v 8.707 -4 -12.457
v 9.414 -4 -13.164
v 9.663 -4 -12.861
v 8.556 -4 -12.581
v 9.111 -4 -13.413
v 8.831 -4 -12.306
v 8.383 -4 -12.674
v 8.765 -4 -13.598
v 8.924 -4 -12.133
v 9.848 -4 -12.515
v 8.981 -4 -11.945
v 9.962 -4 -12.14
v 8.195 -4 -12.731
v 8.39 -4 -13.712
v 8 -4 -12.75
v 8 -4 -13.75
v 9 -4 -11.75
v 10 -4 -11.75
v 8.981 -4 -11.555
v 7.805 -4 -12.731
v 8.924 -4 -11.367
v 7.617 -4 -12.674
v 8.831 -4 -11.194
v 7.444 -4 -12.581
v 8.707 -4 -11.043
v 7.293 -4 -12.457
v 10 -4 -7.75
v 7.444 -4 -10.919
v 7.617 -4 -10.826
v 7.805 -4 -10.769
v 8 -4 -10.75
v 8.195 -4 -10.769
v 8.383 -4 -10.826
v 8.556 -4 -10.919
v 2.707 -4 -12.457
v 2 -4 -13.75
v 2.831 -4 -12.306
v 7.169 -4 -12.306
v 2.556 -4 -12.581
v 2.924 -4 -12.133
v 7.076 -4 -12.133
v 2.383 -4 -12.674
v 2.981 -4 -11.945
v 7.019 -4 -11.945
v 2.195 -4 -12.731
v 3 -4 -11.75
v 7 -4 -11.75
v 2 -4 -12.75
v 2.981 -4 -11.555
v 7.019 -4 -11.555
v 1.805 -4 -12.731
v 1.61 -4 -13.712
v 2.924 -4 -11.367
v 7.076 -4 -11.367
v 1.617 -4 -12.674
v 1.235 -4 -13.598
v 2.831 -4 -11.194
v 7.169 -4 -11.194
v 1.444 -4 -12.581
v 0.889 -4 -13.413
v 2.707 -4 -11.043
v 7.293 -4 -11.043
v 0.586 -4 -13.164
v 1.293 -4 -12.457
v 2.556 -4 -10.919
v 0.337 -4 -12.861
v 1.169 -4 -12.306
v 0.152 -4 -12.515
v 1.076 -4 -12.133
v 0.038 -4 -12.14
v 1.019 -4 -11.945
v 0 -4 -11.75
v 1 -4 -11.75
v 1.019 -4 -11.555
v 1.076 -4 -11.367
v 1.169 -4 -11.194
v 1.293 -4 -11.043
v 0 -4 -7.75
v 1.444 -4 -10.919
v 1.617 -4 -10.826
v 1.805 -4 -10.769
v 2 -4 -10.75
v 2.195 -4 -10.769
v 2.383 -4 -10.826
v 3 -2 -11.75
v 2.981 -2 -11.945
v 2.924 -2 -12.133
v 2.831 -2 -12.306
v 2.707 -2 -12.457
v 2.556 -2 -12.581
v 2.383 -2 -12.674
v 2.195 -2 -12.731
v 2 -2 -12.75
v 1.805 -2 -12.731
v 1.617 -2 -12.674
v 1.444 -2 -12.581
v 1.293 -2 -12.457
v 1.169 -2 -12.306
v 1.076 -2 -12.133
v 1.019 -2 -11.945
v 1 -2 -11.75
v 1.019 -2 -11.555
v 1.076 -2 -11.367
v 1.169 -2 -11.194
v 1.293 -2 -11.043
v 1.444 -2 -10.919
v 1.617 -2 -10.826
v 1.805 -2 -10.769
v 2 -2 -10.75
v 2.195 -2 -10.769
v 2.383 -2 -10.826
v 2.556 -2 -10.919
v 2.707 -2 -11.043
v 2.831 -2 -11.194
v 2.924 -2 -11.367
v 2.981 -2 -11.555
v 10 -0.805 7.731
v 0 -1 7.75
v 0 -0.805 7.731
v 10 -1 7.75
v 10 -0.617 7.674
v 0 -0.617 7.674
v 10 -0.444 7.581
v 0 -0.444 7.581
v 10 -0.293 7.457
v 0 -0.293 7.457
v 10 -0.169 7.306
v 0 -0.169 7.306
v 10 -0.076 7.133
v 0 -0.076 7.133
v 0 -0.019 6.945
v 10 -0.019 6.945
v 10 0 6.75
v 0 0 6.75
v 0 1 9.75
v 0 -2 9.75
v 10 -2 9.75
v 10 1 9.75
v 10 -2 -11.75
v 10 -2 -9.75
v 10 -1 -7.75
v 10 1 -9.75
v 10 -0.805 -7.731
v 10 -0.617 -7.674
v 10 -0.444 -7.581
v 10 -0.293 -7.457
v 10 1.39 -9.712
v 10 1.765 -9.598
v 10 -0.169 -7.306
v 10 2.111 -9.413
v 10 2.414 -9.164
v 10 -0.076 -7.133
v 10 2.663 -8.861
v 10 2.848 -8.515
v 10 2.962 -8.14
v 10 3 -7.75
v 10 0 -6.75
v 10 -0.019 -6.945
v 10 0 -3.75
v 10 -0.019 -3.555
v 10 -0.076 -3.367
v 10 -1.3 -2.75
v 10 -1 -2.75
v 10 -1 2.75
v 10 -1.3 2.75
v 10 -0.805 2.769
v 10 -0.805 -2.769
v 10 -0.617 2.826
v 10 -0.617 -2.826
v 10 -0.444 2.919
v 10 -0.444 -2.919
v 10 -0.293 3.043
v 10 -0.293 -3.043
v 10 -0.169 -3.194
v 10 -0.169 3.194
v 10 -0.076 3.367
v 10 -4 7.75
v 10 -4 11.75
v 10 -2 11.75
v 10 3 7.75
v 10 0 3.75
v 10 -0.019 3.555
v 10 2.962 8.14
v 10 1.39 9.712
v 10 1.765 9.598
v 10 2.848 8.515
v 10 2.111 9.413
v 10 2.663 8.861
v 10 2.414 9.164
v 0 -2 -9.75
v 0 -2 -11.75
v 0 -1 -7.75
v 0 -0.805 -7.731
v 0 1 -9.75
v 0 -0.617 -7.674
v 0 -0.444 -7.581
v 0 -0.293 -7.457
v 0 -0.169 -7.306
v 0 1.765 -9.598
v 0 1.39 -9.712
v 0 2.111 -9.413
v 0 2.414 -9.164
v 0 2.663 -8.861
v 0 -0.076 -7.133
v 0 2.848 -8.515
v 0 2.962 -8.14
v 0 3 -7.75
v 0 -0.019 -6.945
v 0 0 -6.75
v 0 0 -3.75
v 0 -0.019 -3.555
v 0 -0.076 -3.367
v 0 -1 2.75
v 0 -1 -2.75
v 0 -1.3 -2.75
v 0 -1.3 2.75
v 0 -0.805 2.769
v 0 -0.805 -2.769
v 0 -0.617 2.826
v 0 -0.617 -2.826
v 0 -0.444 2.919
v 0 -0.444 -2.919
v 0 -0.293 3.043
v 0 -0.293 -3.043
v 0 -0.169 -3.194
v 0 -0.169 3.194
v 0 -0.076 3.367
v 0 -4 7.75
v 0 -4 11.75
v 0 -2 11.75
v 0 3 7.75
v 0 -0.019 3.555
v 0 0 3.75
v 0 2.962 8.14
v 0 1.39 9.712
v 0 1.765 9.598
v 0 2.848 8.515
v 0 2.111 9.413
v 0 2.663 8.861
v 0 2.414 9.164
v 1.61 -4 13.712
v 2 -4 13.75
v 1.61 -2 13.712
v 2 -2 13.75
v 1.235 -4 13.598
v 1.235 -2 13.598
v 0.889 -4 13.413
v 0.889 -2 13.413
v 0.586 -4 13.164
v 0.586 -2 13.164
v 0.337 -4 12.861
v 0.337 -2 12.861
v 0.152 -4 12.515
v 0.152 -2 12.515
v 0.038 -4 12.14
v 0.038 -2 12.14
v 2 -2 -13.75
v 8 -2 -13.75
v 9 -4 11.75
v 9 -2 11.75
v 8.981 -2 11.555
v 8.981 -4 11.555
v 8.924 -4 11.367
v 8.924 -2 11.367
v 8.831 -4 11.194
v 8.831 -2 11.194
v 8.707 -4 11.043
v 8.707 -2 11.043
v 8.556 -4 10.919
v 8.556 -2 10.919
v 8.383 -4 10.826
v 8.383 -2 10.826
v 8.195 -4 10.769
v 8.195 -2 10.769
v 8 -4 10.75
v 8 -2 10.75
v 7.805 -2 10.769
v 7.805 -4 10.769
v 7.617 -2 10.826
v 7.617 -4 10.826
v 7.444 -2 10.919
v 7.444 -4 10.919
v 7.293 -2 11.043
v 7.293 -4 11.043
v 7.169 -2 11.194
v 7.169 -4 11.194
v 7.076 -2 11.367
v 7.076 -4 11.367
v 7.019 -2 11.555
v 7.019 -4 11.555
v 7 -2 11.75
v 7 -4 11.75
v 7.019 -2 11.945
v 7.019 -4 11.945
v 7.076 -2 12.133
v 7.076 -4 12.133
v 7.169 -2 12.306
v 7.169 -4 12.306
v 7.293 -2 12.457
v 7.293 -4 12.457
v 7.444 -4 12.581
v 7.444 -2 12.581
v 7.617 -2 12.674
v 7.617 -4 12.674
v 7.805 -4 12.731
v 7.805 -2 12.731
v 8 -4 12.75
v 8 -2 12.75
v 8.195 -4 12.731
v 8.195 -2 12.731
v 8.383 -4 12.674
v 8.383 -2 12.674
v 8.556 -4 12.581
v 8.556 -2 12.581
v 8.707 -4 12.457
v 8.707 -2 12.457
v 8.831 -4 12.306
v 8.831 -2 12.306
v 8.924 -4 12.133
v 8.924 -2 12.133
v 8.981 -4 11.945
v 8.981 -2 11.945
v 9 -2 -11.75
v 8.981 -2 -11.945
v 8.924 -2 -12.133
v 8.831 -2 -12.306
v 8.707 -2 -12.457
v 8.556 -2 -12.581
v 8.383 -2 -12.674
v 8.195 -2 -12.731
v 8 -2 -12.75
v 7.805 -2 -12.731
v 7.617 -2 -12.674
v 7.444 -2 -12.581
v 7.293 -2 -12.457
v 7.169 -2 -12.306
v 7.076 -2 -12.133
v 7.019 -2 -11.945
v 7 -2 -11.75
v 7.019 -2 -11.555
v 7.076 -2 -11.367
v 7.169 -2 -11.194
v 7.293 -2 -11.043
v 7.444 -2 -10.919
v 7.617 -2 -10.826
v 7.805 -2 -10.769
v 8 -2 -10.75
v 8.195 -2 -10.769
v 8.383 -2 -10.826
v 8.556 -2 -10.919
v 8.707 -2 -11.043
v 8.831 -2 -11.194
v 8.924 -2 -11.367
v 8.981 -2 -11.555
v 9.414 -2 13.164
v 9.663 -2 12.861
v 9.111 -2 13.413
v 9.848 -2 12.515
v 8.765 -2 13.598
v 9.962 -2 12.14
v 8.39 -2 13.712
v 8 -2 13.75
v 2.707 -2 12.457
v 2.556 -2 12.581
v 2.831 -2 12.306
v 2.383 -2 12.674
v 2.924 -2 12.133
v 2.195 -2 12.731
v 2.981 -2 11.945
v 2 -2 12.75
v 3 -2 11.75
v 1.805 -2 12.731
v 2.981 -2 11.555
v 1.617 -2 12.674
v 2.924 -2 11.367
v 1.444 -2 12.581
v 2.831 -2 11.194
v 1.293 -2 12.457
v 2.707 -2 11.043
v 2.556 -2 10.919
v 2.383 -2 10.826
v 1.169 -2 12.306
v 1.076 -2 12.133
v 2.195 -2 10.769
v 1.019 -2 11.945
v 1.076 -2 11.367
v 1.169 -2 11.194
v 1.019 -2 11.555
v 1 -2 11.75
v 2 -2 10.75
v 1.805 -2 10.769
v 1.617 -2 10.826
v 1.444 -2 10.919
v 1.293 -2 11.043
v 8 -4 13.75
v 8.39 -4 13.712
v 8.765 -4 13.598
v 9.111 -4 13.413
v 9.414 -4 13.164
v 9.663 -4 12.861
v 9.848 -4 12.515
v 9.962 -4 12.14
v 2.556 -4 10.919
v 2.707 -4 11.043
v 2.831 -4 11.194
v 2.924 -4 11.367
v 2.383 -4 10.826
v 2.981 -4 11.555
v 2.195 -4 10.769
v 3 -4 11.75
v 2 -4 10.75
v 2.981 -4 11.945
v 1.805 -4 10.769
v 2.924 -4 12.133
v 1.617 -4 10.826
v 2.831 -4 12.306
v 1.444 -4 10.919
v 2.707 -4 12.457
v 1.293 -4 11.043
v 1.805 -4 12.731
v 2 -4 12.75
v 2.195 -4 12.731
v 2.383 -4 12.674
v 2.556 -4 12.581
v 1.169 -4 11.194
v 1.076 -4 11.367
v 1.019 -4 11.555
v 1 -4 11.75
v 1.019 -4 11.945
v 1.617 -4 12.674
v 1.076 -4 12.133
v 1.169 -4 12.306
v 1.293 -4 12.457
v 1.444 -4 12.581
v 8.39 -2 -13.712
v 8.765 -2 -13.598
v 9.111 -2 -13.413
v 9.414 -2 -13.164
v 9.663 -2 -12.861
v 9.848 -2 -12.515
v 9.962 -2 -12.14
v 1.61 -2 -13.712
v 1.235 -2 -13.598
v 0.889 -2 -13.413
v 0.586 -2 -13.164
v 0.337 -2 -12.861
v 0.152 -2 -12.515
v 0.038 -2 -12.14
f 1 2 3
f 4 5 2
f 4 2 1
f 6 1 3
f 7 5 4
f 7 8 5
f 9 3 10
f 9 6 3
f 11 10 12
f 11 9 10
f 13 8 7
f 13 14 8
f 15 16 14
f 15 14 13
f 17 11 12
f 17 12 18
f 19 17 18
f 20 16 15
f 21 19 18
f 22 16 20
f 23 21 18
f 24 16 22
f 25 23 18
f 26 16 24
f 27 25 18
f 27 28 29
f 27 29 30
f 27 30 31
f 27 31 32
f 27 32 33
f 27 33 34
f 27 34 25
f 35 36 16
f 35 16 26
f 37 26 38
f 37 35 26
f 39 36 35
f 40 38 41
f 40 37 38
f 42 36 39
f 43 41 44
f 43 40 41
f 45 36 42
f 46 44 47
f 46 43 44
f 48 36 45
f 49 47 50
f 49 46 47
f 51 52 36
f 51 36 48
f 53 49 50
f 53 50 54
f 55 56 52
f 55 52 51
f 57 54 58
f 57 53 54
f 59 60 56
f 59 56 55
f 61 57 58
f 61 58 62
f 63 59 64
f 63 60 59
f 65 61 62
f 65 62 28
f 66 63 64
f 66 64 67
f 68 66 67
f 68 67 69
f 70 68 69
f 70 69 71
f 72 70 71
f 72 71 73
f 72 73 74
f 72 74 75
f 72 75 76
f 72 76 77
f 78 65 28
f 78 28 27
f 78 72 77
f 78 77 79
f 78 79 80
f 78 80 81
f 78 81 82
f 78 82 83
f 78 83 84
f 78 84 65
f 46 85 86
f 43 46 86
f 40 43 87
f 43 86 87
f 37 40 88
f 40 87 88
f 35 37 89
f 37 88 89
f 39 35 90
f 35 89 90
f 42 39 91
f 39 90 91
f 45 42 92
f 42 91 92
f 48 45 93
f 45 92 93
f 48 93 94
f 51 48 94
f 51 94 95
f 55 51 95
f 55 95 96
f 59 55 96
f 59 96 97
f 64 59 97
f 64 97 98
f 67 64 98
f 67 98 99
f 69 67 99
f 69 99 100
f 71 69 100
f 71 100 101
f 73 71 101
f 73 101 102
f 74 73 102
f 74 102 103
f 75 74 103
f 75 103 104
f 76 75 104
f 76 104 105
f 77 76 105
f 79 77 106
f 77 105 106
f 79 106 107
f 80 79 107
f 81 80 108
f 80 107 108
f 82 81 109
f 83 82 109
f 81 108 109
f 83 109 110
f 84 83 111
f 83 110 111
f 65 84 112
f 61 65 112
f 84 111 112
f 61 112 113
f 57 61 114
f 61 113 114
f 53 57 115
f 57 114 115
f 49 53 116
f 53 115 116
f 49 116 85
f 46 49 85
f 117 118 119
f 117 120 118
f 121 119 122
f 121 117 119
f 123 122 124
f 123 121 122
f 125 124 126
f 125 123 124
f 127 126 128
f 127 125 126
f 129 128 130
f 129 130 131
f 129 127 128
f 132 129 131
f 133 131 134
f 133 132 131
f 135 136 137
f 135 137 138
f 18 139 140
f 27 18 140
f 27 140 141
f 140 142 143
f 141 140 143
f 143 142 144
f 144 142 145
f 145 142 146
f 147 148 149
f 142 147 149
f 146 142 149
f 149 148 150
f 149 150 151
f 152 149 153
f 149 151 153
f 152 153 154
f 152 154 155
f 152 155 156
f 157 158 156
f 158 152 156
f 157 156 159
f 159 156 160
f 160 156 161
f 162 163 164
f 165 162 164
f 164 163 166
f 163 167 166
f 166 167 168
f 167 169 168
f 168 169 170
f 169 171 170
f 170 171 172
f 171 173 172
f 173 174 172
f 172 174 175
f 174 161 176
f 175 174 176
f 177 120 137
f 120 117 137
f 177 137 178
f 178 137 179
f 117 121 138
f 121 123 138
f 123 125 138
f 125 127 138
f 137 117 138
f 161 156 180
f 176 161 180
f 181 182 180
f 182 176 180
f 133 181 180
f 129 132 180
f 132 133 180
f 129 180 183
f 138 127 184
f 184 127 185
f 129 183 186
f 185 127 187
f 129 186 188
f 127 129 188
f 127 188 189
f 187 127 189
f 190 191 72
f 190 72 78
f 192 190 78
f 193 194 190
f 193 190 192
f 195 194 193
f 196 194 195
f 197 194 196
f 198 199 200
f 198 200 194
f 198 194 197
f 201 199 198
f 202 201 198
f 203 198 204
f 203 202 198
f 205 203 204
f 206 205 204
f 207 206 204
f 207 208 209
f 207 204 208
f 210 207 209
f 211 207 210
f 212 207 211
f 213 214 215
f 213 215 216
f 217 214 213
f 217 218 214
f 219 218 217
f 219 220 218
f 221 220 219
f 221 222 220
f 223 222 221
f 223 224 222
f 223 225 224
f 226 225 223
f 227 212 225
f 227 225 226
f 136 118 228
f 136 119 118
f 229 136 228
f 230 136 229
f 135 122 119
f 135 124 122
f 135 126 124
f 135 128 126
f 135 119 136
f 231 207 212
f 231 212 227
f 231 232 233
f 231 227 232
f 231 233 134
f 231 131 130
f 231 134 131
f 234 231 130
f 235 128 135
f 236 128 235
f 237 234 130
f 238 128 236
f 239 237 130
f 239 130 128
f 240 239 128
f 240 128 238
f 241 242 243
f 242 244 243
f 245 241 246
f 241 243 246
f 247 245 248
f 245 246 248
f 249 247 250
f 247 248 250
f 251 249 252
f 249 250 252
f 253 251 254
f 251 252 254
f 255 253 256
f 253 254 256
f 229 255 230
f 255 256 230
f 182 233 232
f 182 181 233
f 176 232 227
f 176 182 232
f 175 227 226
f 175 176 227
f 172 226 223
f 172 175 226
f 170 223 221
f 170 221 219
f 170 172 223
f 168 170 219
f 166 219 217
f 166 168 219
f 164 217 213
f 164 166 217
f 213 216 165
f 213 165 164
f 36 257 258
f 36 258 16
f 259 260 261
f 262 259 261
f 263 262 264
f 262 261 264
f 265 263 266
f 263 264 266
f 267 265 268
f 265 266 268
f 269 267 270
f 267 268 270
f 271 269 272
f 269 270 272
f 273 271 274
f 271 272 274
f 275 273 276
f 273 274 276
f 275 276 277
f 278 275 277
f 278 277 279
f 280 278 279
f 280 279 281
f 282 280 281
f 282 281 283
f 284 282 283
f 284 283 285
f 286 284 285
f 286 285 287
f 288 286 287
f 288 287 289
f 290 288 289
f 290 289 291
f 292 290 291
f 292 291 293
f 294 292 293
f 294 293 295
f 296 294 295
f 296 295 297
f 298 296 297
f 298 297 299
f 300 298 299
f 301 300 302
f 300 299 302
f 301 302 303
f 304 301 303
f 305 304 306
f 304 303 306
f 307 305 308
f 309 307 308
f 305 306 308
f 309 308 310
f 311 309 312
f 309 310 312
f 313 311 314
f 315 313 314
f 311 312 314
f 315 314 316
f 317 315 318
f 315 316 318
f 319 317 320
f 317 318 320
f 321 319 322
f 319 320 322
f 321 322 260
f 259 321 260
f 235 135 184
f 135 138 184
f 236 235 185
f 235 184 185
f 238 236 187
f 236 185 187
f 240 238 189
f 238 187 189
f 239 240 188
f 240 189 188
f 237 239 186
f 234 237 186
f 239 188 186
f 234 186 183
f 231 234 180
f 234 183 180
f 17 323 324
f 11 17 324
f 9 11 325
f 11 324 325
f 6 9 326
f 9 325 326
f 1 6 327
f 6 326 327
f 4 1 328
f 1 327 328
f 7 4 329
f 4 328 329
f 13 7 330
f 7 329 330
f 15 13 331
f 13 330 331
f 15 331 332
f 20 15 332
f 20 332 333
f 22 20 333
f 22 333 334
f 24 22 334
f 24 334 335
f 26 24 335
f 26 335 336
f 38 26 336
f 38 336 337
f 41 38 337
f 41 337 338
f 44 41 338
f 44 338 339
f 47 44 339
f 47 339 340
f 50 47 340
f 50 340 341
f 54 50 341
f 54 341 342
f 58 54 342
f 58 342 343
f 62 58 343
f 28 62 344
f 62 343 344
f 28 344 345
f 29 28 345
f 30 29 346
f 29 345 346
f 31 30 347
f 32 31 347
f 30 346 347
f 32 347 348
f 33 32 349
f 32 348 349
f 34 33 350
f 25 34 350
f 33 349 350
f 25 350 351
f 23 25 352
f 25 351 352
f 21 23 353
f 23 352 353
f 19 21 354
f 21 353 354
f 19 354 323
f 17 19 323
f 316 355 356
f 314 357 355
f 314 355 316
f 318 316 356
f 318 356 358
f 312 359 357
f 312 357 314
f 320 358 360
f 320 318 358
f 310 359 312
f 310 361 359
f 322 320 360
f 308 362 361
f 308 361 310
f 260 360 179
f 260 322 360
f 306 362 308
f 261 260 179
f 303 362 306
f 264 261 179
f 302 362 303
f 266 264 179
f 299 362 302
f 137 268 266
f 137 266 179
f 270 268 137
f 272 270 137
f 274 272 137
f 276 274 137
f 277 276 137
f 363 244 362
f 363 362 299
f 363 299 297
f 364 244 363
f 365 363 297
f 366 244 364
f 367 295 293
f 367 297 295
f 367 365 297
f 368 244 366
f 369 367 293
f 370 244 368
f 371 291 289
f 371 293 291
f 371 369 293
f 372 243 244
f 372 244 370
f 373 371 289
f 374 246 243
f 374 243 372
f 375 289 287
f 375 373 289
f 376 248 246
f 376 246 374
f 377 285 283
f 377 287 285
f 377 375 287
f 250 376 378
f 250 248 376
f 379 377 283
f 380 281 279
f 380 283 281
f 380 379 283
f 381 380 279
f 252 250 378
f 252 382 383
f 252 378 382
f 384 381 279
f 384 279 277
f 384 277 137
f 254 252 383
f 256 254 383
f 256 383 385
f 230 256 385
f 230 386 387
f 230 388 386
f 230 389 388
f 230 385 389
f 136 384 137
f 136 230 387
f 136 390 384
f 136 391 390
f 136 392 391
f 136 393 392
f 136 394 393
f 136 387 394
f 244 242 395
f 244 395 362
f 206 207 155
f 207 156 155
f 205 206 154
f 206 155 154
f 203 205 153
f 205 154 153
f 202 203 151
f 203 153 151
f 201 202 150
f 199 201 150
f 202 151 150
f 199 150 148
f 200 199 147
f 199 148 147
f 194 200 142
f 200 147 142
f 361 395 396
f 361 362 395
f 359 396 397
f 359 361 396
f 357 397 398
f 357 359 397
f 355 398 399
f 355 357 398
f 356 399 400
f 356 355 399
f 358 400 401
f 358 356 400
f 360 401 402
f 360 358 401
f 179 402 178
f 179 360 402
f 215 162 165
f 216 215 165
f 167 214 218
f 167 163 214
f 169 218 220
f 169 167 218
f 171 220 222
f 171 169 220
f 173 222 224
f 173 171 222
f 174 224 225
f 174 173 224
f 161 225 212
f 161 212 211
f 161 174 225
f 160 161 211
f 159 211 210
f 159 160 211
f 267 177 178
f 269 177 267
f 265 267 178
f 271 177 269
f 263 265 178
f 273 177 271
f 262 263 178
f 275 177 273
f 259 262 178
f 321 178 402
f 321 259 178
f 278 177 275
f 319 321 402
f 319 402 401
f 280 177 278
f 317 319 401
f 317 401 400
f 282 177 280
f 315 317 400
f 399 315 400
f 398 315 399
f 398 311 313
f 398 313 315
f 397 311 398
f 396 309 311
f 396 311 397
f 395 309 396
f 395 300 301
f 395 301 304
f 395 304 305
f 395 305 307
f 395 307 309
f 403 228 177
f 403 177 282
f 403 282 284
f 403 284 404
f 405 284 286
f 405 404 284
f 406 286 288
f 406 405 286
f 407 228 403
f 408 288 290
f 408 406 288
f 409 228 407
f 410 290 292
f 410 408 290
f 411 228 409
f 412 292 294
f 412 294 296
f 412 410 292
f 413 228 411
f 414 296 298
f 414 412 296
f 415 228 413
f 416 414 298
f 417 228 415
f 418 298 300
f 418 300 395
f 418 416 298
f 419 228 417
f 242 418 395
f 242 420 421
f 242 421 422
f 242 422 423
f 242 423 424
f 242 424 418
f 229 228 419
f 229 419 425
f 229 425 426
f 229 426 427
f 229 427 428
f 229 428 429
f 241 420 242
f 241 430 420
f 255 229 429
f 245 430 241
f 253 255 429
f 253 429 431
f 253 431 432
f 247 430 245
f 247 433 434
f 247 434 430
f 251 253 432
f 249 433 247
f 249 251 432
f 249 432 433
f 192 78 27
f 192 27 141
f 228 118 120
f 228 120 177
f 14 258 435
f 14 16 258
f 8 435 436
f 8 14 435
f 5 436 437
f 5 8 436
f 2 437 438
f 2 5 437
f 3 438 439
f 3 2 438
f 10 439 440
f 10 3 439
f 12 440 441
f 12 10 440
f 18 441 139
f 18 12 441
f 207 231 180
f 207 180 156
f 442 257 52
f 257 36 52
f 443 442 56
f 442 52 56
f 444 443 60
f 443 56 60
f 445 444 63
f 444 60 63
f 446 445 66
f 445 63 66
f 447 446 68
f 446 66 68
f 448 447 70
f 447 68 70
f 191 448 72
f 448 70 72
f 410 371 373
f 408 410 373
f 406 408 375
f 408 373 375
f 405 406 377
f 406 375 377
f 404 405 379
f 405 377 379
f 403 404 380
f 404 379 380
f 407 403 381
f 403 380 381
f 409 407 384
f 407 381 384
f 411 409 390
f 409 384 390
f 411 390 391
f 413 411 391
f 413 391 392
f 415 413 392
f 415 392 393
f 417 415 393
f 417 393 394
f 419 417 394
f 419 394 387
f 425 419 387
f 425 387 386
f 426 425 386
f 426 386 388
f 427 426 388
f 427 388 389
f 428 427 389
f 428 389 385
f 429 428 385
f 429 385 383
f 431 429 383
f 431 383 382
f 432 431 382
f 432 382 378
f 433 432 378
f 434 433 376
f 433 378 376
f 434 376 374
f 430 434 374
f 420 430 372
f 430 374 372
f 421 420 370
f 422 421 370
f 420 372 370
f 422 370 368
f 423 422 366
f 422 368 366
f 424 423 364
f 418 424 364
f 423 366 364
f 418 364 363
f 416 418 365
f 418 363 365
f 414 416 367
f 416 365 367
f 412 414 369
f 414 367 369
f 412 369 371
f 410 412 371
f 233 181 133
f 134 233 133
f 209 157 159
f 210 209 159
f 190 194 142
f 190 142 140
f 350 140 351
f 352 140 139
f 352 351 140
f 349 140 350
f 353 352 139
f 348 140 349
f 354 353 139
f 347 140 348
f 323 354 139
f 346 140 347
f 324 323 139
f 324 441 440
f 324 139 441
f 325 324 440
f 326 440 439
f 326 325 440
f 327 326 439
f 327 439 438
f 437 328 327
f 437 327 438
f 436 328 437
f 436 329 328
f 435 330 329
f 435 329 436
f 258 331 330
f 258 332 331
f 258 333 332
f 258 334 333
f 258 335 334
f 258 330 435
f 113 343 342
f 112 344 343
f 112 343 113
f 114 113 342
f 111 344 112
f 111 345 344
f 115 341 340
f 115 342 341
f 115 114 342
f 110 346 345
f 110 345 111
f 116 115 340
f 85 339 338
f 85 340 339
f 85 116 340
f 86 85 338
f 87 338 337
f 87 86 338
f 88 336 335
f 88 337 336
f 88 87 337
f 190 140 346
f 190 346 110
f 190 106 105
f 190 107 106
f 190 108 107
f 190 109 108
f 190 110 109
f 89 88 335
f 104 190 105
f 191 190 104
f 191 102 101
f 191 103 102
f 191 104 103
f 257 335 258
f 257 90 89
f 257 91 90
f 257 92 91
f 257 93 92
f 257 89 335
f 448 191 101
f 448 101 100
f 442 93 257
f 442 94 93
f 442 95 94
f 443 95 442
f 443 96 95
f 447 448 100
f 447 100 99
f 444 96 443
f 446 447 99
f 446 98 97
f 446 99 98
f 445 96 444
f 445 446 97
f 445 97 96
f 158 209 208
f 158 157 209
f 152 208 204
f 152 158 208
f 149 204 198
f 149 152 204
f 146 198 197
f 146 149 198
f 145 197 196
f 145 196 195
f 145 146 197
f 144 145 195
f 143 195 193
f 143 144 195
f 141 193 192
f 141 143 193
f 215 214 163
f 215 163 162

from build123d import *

# Parameters (mm, degrees)
BOSS_EXTRUDE1_DEPTH     = 10
FILLET1_R               = 2
SKETCH2_R               = 1
CUT_EXTRUDE1_DEPTH      = 6
CUT_EXTRUDE1_DEPTH_BACK = 3
FILLET2_R               = 1


with BuildPart() as part:
    # Sketch1 → Boss-Extrude1 (new body)
    with BuildSketch(Plane(origin=(0, 0, 0), x_dir=(0, 0, -1), z_dir=(1, 0, 0))):
        Polygon((-2.75, 0), (-7.75, 0), (-7.75, -4), (-13.75, -4), (-13.75, -2), (-9.75, -2), (-9.75, 3), (9.75, 3), (9.75, -2), (13.75, -2), (13.75, -4), (7.75, -4), (7.75, 0), (2.75, 0), (2.75, -1.3), (-2.75, -1.3), align=None)
    extrude(amount=BOSS_EXTRUDE1_DEPTH)

    # Fillet1
    fillet1_edges = [part.edges().sort_by_distance(p)[0] for p in [
        (0, -3, 13.75),
        (0, -3, -13.75),
        (5, 3, 9.75),
        (5, 3, -9.75),
        (10, -3, -13.75),
        (10, -3, 13.75),
    ]]
    fillet(fillet1_edges, radius=FILLET1_R)

    # Sketch2 → Cut-Extrude1 (cut, two sides)
    with BuildSketch(Plane(origin=(0, -2, 0), x_dir=(1, 0, 0), z_dir=(0, 1, 0))) as cut_extrude1_sk:
        with Locations((8, -11.75)):
            Circle(SKETCH2_R)
        with Locations((2, -11.75)):
            Circle(SKETCH2_R)
        with Locations((2, 11.75)):
            Circle(SKETCH2_R)
        with Locations((8, 11.75)):
            Circle(SKETCH2_R)
    extrude(amount=CUT_EXTRUDE1_DEPTH, mode=Mode.SUBTRACT)
    extrude(cut_extrude1_sk.sketch, amount=-CUT_EXTRUDE1_DEPTH_BACK, mode=Mode.SUBTRACT)

    # Fillet2
    fillet2_edges = [part.edges().sort_by_distance(p)[0] for p in [
        (5, 0, 2.75),
        (5, 0, 7.75),
        (5, 0, -7.75),
        (5, 0, -2.75),
    ]]
    fillet(fillet2_edges, radius=FILLET2_R)


solid = part.part
